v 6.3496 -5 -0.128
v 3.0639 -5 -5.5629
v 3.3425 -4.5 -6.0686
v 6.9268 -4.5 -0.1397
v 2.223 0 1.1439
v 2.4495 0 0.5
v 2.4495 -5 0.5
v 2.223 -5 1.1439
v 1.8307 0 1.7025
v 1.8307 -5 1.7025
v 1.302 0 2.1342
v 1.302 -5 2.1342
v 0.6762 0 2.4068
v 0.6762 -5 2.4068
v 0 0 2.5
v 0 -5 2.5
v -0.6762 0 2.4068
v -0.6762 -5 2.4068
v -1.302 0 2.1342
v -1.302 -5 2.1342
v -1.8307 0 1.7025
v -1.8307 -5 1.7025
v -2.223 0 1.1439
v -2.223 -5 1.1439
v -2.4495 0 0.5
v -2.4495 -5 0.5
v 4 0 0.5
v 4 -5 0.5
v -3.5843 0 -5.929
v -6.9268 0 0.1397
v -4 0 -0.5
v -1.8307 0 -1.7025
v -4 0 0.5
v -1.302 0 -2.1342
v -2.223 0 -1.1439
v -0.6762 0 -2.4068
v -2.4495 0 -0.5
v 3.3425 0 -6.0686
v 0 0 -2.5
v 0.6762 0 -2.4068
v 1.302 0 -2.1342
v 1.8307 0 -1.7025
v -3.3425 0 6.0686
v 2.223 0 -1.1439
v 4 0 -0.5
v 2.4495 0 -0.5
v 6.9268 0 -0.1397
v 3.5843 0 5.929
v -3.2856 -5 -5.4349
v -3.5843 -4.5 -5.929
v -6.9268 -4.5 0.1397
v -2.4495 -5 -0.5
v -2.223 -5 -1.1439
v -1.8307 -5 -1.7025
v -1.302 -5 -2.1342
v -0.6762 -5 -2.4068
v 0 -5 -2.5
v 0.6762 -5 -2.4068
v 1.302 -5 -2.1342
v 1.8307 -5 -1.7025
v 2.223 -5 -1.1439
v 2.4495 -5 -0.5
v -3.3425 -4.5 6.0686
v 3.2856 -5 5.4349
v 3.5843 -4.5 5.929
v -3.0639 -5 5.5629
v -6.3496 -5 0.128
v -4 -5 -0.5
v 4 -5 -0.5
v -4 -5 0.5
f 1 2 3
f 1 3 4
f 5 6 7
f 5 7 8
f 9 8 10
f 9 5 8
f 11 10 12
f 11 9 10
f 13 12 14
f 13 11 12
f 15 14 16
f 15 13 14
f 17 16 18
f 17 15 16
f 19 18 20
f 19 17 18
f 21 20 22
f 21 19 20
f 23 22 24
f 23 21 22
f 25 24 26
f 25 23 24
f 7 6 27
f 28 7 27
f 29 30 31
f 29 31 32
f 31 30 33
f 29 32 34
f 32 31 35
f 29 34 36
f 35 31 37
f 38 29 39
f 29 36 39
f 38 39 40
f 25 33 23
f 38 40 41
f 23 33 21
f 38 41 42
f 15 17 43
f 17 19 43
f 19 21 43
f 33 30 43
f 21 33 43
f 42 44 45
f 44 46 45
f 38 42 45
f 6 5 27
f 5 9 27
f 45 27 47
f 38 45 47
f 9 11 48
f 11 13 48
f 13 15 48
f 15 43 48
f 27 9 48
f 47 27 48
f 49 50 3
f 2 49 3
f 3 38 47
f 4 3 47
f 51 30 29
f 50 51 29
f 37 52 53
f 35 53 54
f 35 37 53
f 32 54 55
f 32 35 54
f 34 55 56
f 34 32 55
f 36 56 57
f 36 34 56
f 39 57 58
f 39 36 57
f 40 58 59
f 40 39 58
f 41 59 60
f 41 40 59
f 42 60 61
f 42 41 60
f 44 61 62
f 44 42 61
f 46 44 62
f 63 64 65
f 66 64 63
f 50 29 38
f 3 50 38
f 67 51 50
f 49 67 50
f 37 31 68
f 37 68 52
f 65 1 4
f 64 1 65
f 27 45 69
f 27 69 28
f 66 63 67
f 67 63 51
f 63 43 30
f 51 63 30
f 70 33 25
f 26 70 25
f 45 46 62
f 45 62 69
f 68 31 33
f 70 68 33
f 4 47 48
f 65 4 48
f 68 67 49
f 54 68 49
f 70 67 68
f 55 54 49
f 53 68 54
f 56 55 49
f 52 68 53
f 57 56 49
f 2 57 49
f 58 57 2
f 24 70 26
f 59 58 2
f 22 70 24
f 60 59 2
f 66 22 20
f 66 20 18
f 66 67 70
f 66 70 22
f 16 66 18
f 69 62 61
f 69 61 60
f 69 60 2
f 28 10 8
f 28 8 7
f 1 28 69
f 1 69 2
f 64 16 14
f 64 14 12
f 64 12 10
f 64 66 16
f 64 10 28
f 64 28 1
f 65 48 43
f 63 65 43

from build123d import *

# Parameters (mm, degrees)
F0_DEPTH = 5
F1_R     = 2.5
F2_DEPTH = 36.487296
F6_SIZE  = 0.5
F3_W     = 8
F3_H     = 1
F4_DEPTH = 5.527664


with BuildPart() as f0:
    # F5 (on Front) → F0 (new body)
    with BuildSketch(Plane.XZ):
        Polygon((6.926796, -0.139655), (3.584342, 5.928954), (-3.342453, 6.068608), (-6.926796, 0.139655), (-3.584342, -5.928954), (3.342453, -6.068608), align=None)
    extrude(amount=F0_DEPTH)

    # F1 (on face) → F2 (cut)
    with BuildSketch(Plane.XZ):
        Circle(F1_R)
    extrude(amount=F2_DEPTH, mode=Mode.SUBTRACT)

    # F6
    f6_edges = [f0.edges().sort_by_distance(p)[0] for p in [
        (-5.255569, -5, -2.89465),
        (-5.134624, -5, 3.104131),
        (0.120944, -5, 5.998781),
        (5.255569, -5, 2.89465),
        (-0.120944, -5, -5.998781),
        (5.134624, -5, -3.104131),
    ]]
    chamfer(f6_edges, length=F6_SIZE)

    # F3 (on face) → F4 (cut)
    with BuildSketch(Plane.XZ):
        Rectangle(F3_W, F3_H)
    extrude(amount=F4_DEPTH, mode=Mode.SUBTRACT)


solid = f0.part
